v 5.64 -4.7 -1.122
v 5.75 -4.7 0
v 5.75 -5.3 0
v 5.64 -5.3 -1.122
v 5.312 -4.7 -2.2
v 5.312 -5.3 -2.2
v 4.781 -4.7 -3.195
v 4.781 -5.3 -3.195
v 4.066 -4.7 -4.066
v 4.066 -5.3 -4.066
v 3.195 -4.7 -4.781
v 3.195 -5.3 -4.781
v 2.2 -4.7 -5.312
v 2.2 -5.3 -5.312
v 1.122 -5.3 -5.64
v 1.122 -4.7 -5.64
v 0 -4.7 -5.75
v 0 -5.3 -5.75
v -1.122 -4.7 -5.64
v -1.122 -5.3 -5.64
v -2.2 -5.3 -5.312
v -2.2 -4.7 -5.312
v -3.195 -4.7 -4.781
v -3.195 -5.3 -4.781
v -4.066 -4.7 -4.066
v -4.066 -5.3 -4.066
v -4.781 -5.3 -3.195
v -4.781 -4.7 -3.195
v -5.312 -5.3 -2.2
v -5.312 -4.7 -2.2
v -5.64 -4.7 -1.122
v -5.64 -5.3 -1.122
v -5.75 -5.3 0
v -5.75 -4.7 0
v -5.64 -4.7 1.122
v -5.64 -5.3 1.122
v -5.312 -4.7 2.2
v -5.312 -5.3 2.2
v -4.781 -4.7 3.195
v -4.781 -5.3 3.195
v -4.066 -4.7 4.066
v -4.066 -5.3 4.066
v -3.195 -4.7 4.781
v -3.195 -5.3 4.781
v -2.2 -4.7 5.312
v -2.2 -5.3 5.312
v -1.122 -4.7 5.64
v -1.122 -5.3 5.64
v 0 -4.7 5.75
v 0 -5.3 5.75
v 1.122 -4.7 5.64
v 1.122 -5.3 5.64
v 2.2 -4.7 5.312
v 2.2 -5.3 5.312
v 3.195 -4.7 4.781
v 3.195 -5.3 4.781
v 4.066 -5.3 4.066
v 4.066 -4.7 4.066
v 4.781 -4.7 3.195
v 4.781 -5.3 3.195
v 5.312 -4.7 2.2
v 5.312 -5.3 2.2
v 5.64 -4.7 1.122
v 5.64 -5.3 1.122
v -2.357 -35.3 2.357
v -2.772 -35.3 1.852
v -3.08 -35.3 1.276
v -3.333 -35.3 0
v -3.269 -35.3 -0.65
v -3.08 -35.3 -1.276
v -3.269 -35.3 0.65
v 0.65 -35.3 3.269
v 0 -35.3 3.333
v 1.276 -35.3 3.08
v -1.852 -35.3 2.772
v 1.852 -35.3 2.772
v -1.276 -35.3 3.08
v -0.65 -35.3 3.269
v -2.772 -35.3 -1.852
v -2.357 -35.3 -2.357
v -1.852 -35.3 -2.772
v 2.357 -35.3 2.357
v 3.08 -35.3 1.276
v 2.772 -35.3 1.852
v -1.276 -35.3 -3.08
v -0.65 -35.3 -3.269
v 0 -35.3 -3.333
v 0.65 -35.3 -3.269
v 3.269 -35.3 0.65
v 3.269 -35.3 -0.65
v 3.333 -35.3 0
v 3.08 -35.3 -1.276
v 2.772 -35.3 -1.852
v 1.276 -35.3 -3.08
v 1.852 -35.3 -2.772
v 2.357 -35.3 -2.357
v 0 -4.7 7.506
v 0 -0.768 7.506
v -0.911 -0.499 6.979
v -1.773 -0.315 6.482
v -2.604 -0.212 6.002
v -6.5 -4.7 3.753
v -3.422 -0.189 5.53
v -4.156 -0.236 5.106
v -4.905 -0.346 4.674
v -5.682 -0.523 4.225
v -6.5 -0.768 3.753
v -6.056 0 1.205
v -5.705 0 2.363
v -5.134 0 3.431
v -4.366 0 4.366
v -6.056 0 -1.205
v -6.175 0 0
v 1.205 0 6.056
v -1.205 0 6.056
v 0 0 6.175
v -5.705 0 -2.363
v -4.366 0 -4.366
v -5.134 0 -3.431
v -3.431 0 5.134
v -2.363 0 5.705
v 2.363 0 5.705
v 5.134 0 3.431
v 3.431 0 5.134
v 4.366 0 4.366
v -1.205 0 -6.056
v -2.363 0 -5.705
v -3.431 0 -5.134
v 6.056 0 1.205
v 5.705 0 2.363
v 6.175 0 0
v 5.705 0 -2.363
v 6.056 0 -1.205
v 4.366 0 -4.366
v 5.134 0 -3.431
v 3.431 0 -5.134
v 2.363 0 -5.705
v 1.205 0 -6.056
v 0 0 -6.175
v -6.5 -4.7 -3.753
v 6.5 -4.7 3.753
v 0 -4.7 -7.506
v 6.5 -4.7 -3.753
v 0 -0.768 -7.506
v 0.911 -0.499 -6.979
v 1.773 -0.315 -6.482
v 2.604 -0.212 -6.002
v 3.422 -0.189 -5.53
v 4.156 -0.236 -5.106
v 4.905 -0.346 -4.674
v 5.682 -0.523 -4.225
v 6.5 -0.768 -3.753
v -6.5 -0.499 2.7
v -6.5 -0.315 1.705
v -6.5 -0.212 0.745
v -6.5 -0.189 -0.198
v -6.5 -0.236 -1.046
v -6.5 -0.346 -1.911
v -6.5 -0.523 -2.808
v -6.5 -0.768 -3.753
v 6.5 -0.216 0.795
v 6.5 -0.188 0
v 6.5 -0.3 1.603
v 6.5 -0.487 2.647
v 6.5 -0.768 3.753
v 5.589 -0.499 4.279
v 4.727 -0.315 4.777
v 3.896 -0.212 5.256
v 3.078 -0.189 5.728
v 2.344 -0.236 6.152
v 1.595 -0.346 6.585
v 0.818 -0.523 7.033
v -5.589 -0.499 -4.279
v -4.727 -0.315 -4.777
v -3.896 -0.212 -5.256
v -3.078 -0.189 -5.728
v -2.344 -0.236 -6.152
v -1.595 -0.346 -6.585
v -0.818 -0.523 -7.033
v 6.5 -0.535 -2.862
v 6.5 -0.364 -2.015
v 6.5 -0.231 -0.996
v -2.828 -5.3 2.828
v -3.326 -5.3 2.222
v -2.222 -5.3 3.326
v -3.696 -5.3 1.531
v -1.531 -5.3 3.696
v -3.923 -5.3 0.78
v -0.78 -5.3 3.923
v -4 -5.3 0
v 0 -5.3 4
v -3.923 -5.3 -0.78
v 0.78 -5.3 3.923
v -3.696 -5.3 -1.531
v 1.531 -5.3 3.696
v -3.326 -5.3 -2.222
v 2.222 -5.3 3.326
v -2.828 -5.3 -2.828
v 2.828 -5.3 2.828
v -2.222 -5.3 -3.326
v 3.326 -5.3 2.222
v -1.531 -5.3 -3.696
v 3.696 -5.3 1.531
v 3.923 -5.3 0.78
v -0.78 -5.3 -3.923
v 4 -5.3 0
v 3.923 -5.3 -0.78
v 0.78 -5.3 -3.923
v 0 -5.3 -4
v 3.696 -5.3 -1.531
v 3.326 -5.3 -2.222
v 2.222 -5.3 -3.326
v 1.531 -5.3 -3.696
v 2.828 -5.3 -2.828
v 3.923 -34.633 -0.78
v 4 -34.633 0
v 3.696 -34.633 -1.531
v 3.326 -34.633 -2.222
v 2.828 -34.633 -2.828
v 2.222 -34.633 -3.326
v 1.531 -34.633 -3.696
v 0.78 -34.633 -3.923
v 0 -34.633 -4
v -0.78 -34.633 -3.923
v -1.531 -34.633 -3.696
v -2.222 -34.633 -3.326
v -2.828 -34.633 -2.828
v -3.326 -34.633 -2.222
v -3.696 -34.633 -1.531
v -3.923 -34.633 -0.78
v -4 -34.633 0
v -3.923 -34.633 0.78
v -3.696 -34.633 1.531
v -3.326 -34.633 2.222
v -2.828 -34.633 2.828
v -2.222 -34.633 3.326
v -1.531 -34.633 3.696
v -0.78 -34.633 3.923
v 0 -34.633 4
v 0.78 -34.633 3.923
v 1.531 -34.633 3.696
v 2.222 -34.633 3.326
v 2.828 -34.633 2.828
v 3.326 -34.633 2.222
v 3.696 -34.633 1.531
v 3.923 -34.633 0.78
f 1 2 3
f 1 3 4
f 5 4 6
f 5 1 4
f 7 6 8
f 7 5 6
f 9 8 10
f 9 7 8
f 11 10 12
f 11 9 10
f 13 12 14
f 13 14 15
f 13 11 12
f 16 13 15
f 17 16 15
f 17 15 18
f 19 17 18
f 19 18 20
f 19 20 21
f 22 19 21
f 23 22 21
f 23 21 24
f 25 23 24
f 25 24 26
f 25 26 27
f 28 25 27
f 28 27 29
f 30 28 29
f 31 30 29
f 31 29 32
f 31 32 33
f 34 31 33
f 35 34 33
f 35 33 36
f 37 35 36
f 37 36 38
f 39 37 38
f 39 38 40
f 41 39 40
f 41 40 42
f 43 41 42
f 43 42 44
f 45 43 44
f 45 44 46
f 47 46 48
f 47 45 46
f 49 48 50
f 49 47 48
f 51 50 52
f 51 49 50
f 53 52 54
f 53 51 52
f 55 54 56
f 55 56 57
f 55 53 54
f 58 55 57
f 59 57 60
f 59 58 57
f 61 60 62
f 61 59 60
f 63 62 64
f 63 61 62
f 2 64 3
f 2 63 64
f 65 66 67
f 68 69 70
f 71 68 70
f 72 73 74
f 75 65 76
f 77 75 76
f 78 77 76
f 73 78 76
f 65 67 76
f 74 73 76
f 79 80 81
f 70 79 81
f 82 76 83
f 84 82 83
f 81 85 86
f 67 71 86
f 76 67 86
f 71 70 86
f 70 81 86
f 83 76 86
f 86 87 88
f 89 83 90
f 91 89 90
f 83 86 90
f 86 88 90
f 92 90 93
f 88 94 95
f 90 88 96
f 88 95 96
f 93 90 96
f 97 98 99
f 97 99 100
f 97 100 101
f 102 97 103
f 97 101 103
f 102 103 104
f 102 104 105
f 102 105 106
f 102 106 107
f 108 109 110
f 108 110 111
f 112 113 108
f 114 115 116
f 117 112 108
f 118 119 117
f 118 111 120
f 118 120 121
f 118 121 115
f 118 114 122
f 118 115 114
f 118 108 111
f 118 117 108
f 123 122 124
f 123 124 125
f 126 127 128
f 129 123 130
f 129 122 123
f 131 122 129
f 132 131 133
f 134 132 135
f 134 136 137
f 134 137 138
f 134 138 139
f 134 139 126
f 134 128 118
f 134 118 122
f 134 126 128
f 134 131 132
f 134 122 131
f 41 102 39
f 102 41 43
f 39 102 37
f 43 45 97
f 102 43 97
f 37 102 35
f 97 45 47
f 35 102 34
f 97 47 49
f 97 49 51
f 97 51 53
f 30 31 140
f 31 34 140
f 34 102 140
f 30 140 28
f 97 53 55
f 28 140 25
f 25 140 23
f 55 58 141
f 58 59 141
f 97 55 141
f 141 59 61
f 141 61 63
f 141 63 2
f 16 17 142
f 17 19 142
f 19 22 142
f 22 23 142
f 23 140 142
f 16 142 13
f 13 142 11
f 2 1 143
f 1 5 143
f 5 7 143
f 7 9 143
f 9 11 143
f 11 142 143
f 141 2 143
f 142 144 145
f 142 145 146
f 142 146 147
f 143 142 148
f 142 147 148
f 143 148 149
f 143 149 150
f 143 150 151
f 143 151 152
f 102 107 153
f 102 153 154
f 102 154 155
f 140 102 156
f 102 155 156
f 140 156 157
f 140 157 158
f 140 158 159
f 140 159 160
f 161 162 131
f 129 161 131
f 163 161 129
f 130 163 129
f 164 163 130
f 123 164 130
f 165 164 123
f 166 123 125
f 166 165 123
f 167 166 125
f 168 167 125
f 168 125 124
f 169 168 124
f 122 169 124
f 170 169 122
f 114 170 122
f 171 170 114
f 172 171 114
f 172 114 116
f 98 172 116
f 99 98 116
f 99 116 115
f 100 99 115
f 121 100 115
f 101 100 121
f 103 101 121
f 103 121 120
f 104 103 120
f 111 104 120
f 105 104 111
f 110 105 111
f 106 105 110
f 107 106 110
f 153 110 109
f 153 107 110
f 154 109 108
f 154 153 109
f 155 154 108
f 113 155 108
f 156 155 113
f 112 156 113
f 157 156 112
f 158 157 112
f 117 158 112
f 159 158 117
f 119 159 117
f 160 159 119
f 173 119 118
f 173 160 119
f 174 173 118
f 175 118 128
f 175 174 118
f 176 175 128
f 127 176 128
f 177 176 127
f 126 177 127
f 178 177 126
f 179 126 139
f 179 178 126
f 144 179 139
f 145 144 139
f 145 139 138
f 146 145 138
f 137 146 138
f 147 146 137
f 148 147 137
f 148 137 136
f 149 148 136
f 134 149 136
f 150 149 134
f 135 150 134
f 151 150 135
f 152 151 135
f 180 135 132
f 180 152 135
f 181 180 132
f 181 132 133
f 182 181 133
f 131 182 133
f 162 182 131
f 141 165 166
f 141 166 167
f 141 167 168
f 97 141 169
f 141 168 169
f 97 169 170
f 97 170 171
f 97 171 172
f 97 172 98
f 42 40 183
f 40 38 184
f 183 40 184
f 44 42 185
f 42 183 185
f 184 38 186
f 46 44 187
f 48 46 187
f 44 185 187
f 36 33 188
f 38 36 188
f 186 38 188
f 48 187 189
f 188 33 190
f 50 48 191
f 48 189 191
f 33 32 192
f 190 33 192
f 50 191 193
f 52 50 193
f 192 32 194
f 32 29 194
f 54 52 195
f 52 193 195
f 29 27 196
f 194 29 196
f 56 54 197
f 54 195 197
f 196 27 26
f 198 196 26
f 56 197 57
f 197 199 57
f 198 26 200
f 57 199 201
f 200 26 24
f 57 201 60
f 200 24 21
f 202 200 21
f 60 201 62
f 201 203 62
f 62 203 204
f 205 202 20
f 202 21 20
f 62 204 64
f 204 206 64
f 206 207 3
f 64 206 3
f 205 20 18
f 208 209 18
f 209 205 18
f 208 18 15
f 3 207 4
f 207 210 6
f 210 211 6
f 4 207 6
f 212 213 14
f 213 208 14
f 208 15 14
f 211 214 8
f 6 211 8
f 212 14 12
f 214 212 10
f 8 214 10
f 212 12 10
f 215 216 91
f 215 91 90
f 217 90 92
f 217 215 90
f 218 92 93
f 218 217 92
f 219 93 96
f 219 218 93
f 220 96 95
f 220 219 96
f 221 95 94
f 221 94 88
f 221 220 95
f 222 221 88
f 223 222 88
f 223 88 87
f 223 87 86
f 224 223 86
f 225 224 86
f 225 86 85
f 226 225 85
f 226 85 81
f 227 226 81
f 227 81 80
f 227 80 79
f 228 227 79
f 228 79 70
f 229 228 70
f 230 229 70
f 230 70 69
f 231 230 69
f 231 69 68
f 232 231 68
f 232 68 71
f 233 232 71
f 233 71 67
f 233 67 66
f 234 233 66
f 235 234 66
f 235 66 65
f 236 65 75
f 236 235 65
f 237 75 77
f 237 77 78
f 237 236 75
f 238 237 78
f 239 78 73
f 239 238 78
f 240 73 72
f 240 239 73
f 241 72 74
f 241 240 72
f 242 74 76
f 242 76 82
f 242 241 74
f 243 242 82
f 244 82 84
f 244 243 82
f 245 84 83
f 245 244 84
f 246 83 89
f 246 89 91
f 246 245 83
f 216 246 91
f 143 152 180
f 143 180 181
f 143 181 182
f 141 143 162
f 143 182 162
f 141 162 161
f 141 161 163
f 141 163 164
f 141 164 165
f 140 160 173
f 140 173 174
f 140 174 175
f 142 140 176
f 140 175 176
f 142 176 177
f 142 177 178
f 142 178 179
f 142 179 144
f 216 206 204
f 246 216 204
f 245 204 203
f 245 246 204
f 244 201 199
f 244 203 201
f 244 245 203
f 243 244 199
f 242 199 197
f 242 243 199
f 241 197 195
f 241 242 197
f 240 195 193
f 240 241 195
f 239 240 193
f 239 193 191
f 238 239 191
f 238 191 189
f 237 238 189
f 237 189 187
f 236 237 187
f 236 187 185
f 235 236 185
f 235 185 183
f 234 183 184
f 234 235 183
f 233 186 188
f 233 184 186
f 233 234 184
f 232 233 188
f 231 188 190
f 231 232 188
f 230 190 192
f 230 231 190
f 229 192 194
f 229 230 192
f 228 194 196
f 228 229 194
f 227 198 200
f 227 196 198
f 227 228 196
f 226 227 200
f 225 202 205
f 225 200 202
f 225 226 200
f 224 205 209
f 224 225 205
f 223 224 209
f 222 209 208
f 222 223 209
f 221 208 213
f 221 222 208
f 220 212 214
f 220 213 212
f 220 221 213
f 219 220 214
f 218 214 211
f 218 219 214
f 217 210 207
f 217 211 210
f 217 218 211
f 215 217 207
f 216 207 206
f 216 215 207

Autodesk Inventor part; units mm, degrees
ref_plane "YZ Plane" through (0, 0, 0) normal (1, 0, 0) x (0, 1, 0)
ref_plane "XZ Plane" through (0, 0, 0) normal (0, 1, 0) x (-1, 0, 0)
ref_plane "XY Plane" through (0, 0, 0) normal (0, 0, 1) x (1, 0, 0)
sketch "Sketch1" plane through (0, 0, 0) normal (0, 0, 1) x (1, 0, 0)
  line L0 (0, 0) -> (6.175, 0)
  line L1 (9.75, -2.064) -> (9.75, -4.7)
  line L2 (5.75, -5.3) -> (4, -5.3)
  line L3 (4, -5.3) -> (4, -35.3)
  line L4 (4, -35.3) -> (0, -35.3)
  line L5 (0, -35.3) -> (0, 0)
  line L6 (5.75, -5.3) -> (5.75, -4.7)
  line L7 (5.75, -4.7) -> (9.75, -4.7)
  line L8 (6.175, 0) -> (9.75, -2.064)
  dimension "d0" = 19.5
  dimension "d1" = 8
  dimension "d3" = 30
  dimension "d4" = 11.5
  dimension "d5" = 0.6
  dimension "d22" = 30
  dimension "d23" = 12.35
  dimension "d24" = 5.3
revolve "Revolution1" add sketch "Sketch1" angle 360 about axis through (0, -35.3, 0) along (0, 1, 0)
sketch "Sketch2" plane through (0, 0, 0) normal (0, 1, 0) x (1, 0, 0)
  line L0 (0, -7.5056) -> (-6.5, -3.7528)
  line L1 (-6.5, -3.7528) -> (-6.5, 3.7528)
  line L2 (-6.5, 3.7528) -> (0, 7.5056)
  line L3 (0, 7.5056) -> (6.5, 3.7528)
  line L4 (6.5, 3.7528) -> (6.5, -3.7528)
  line L5 (6.5, -3.7528) -> (0, -7.5056)
  circle A0 centre (0, 0) radius 9.75 projected
  point P0 (0, 0)
  point P1 (0, 0)
  dimension "d25" = 13
extrude "Extrusion1" cut sketch "Sketch2" against normal blind 5.3
thread "Thread1" size "M8x1.25" class "6g" standard "ISO Metric profile" length 22
chamfer "Chamfer1" distance 0.6667 angle 45 1 edges at (-4, -35.3, 0)
equation "\"d0\" = 1.5 * S_"
equation "\"d1\" = d1_"
equation "\"d3\" = L"
equation "\"d4\" = dw"
equation "\"d5\" = hw"
equation "\"d23\" = 0.95 * S_"
equation "\"d24\" = k"
equation "\"d14\" = b"
equation "\"d16\" = 0.0833333 * d"
equation "\"d25\" = S_"
equation "\"d26\" = k"
equation "\"d\" = 8"
equation "\"d1_\" = 8"
equation "\"S_\" = 13"
equation "\"k\" = 5.3"
equation "\"e\" = 14.2"
equation "\"L\" = 30"
equation "\"b\" = 22"
equation "\"Grip_Length\" = 8"
equation "\"dw\" = 11.5"
equation "\"hw\" = 0.6"
properties part number "Bolt A M8-6g×30(S13) GOST 7798-70" material "Steel, Mild"
